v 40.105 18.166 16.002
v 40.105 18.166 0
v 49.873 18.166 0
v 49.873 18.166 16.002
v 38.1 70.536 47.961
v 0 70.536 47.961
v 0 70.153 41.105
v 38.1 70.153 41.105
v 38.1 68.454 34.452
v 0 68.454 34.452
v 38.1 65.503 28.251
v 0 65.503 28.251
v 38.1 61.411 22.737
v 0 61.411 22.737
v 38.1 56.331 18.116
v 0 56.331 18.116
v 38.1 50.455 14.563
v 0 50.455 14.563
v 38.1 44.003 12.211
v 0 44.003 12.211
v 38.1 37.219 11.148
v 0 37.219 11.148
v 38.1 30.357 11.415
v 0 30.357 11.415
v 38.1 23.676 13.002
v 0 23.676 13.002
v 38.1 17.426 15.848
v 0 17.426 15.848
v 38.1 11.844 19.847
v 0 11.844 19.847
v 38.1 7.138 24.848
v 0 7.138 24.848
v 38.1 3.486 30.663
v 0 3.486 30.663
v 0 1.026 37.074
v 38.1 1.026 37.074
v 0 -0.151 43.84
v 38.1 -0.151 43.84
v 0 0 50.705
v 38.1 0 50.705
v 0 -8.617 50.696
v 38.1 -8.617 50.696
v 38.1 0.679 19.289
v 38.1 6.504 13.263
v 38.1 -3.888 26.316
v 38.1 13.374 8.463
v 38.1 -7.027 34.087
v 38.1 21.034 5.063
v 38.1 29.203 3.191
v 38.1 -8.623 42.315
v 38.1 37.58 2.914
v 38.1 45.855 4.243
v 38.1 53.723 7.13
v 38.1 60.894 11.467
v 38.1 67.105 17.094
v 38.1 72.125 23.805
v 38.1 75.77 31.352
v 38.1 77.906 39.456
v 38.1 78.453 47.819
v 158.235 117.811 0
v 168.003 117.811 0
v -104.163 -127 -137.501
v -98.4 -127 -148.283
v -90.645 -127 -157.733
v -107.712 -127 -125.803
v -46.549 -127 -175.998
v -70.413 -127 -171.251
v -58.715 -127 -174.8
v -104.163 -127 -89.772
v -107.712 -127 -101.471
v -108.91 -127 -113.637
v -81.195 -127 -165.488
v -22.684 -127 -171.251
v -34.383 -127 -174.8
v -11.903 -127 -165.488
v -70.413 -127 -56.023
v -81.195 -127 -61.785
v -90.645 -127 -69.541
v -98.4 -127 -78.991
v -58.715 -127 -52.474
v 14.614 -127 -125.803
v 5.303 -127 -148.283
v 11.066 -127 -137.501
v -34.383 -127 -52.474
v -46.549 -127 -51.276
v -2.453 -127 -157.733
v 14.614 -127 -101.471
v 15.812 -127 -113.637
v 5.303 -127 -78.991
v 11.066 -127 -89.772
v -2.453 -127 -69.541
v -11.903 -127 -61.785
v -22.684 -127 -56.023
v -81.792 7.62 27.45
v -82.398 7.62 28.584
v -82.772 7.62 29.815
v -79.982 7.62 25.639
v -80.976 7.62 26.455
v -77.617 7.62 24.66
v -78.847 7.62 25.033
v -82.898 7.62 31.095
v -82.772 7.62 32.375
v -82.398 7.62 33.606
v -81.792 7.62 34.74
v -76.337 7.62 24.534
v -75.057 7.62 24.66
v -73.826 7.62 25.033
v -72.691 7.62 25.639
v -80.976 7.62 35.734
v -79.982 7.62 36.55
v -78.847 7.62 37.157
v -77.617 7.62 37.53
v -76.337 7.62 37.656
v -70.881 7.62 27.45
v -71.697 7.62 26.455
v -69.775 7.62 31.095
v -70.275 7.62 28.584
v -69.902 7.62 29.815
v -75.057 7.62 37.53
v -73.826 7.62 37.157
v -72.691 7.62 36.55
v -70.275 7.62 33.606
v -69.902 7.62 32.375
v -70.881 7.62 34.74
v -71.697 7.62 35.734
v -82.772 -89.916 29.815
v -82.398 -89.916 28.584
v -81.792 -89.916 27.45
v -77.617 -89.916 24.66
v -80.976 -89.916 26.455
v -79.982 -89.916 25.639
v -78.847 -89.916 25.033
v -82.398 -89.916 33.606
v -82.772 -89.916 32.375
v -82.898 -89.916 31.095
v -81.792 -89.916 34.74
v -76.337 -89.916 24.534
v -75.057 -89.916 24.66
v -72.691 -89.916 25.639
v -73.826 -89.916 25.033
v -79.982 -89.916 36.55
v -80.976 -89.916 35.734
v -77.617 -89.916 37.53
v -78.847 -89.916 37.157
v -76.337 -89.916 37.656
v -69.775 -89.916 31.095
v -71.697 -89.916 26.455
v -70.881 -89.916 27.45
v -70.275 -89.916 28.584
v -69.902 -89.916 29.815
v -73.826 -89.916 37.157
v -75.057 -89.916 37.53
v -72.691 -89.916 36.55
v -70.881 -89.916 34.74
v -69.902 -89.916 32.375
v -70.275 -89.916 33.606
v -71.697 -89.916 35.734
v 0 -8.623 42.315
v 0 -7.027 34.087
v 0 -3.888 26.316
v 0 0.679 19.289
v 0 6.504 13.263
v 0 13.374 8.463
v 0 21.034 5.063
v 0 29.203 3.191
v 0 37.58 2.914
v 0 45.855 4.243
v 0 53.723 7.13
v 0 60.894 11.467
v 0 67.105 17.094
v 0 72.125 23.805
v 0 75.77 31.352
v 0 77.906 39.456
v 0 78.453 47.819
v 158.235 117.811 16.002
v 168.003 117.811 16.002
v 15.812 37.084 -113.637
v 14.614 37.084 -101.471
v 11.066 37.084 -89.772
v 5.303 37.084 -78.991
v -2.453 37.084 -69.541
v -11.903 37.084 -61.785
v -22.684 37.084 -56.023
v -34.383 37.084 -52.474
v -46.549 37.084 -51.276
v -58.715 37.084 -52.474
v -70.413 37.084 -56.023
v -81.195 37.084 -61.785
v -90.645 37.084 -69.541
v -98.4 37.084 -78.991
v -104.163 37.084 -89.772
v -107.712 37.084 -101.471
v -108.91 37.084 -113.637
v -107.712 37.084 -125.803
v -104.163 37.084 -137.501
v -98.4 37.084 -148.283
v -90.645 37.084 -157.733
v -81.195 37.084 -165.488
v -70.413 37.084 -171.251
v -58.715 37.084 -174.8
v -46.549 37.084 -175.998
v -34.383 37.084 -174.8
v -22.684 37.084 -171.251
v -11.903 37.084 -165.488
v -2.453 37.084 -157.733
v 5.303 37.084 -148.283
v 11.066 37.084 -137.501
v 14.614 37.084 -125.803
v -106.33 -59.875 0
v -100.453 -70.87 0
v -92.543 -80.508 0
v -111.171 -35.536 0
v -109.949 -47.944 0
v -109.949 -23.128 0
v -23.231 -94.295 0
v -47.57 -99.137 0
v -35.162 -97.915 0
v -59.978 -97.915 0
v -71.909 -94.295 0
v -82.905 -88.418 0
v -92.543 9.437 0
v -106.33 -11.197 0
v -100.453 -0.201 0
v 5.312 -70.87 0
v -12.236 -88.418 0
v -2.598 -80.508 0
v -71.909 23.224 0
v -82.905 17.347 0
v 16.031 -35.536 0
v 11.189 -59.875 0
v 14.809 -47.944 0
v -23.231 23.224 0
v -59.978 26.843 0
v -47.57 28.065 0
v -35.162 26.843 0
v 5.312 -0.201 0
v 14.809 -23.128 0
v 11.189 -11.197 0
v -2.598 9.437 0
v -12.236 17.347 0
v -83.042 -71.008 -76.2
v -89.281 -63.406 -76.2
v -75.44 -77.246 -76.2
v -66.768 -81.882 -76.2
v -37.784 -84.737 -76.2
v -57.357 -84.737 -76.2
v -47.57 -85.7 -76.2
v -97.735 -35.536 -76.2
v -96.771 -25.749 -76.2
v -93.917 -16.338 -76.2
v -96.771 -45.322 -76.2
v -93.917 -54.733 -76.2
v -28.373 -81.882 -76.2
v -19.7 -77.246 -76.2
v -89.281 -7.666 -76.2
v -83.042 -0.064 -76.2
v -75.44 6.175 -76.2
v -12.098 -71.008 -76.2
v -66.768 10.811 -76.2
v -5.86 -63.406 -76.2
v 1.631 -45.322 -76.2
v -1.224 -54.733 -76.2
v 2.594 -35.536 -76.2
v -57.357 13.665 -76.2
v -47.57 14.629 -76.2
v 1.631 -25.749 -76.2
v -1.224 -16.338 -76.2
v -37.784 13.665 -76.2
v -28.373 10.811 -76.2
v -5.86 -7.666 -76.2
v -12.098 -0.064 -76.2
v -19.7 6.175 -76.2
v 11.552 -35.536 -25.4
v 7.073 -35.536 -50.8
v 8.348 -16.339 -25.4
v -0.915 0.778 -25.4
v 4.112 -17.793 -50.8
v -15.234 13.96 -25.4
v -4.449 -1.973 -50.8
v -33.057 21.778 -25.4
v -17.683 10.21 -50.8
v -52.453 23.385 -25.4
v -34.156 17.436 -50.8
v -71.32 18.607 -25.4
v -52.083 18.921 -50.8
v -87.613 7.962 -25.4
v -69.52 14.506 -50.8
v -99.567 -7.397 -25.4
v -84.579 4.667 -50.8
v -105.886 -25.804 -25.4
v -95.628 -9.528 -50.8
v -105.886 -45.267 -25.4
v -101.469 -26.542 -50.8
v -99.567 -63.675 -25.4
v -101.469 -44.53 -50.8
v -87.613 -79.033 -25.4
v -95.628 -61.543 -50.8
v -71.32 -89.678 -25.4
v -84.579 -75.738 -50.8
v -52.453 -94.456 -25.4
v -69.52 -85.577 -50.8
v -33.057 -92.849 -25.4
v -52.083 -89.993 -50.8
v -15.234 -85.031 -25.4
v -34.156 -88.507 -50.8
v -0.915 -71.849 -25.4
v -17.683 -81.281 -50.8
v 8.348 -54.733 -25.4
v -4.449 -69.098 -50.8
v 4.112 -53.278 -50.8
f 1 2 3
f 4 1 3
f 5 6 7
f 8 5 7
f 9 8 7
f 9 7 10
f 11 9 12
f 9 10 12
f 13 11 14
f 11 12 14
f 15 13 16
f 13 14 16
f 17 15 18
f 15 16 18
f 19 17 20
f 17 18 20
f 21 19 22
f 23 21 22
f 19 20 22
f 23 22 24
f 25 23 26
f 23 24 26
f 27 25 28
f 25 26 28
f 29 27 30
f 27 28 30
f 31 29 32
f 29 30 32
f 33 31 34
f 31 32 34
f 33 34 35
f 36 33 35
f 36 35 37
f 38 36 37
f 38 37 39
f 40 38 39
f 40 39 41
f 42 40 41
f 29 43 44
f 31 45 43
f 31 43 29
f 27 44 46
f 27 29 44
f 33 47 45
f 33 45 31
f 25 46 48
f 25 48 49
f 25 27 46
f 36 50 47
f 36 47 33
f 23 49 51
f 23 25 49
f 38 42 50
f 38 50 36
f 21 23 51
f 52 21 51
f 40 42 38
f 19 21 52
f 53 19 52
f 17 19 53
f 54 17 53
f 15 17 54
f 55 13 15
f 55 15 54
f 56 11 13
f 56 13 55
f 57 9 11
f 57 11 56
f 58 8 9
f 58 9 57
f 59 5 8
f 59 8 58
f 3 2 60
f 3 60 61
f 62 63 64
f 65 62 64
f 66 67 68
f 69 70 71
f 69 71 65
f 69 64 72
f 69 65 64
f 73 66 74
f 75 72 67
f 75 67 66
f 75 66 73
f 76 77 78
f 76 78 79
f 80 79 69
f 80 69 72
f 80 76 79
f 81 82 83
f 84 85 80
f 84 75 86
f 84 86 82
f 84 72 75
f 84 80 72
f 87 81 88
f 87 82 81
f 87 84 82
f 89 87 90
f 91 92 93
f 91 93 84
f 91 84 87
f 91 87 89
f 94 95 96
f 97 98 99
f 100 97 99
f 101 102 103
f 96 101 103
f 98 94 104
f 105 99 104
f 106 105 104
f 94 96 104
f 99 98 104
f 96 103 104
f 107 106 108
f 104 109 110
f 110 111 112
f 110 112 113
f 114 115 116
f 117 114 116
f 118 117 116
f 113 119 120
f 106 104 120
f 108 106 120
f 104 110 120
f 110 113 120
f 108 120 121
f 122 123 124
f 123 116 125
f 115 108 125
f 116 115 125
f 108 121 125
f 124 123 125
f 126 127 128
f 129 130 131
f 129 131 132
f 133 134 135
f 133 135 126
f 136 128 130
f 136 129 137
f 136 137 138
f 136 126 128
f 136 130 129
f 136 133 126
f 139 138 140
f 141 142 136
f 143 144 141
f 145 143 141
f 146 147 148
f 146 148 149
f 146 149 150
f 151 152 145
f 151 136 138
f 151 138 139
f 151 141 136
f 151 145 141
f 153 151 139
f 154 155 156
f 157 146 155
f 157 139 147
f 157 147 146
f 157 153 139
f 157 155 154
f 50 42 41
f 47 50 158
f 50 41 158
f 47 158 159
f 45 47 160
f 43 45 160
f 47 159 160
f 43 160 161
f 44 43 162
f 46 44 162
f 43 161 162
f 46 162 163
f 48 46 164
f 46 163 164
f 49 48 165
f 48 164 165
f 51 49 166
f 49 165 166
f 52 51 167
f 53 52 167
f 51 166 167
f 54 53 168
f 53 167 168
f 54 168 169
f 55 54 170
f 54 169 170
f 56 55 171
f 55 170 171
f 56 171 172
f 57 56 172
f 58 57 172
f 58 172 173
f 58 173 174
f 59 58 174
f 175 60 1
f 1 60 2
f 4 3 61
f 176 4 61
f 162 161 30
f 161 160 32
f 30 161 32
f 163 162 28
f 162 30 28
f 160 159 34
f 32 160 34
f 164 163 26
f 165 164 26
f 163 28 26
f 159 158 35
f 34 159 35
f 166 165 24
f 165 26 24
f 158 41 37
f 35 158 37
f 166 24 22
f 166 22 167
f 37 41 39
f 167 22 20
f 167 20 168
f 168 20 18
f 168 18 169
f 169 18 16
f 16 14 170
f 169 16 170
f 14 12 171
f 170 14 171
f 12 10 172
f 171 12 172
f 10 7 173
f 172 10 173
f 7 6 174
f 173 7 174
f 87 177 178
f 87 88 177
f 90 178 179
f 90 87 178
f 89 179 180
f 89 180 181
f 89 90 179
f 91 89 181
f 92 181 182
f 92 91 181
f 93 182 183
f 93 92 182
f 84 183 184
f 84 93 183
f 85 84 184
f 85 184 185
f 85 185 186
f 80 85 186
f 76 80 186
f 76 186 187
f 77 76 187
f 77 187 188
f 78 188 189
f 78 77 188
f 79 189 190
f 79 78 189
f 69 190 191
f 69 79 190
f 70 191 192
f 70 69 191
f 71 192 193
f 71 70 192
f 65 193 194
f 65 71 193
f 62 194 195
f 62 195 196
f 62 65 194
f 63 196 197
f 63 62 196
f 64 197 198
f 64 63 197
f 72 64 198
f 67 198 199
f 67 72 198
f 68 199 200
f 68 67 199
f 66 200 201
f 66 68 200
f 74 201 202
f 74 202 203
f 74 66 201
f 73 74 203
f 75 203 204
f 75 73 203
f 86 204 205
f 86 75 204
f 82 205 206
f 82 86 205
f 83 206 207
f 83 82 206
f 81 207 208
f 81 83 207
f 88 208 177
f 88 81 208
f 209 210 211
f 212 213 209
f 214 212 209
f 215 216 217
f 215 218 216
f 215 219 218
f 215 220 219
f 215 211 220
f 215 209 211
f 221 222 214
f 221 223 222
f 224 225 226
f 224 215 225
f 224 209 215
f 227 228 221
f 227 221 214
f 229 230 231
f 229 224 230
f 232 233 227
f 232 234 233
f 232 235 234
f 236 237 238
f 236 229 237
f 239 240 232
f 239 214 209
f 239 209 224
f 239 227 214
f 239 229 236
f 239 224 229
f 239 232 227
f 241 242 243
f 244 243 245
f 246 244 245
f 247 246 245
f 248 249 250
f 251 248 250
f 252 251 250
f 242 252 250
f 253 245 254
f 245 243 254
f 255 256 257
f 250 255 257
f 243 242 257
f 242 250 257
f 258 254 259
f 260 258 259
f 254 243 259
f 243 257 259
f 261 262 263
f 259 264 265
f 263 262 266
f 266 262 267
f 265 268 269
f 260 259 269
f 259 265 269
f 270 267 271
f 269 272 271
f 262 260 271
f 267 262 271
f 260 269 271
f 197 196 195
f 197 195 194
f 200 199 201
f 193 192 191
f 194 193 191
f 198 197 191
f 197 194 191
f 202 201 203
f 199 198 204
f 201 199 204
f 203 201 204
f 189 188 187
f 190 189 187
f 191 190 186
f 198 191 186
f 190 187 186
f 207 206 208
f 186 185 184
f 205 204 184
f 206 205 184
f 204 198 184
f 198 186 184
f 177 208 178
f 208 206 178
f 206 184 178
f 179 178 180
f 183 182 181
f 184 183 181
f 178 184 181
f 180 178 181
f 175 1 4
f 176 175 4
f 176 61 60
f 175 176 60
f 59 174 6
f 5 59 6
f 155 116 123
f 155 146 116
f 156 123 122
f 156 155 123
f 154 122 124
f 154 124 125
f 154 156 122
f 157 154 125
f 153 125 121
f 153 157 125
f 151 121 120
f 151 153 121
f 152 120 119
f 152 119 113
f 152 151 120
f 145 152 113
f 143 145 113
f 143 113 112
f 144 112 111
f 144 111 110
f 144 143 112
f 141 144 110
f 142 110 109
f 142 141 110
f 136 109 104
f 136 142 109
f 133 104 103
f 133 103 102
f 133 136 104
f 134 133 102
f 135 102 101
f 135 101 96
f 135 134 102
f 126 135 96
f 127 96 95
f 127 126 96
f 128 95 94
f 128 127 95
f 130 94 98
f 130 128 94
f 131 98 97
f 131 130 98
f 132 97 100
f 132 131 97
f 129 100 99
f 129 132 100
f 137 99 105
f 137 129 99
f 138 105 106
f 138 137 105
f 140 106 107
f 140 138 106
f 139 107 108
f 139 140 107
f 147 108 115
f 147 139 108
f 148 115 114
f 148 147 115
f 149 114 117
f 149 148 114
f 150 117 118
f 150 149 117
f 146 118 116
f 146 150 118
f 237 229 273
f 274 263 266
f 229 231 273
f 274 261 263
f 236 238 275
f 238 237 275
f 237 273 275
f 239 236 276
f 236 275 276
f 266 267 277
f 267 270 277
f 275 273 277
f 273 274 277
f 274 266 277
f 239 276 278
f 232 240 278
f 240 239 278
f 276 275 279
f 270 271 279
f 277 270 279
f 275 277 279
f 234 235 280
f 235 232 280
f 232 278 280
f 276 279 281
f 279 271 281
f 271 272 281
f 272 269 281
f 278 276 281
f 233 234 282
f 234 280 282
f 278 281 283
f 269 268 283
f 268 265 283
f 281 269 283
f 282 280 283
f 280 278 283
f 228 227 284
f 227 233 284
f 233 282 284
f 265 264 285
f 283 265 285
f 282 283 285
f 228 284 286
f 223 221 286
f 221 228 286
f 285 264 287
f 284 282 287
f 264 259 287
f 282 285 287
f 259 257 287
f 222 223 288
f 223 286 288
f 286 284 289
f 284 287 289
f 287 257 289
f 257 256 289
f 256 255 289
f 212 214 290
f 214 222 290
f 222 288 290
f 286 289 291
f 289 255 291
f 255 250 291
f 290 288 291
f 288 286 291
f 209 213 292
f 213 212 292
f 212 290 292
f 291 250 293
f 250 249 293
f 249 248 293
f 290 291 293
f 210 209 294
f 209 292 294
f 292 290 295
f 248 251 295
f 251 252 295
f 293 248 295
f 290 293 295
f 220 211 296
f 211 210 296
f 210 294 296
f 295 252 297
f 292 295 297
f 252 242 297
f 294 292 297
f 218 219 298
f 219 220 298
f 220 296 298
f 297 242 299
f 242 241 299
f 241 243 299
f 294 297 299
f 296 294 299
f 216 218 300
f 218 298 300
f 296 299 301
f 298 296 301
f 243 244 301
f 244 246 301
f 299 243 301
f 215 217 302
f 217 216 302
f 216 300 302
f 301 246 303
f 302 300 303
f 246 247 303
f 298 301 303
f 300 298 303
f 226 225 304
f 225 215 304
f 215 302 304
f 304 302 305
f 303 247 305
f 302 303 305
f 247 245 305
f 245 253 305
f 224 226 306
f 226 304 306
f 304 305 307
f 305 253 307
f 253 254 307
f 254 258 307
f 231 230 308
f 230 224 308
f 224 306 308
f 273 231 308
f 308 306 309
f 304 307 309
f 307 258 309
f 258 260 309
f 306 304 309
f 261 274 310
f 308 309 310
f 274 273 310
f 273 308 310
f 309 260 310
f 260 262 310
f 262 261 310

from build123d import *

# Parameters (mm, degrees)
F0_R          = 63.6009786396
F1_DEPTH      = 76.2
F1_TAPER      = 10
F2_R          = 62.3611729576
F3_DEPTH      = 127
F3_DEPTH_BACK = 37.084
F4_R          = 6.5611651664
F5_DEPTH      = 89.916
F5_DEPTH_BACK = 7.62
F7_DEPTH      = 16.002
F9_DEPTH      = 38.1


with BuildPart() as f1:
    # F0 (on Top) → F1 (new body)
    with BuildSketch(Plane.XY):
        with Locations((-47.5703850389, -35.5356149375)):
            Circle(F0_R)
    extrude(amount=-F1_DEPTH, taper=F1_TAPER)


with BuildPart() as f3:
    # F2 (on Front) → F3 (new body, two sides)
    with BuildSketch(Plane.XZ) as f3_sk:
        with Locations((-46.5486980975, -113.6368736625)):
            Circle(F2_R)
    extrude(amount=F3_DEPTH)
    extrude(f3_sk.sketch, amount=-F3_DEPTH_BACK)


with BuildPart() as f5:
    # F4 (on Front) → F5 (new body, two sides)
    with BuildSketch(Plane.XZ) as f5_sk:
        with Locations((-76.3366222382, 31.0949012637)):
            Circle(F4_R)
    extrude(amount=F5_DEPTH)
    extrude(f5_sk.sketch, amount=-F5_DEPTH_BACK)


with BuildPart() as f7:
    # F6 (on Top) → F7 (new body)
    with BuildSketch(Plane.XY):
        Polygon((40.1048237091, 18.1659460068), (49.8731993139, 18.1659460068), (168.0032251769, 117.8109869361), (158.2348495722, 117.8109869361), align=None)
    extrude(amount=F7_DEPTH)


with BuildPart() as f9:
    # F8 (on Right) → F9 (new body)
    with BuildSketch(Plane.YZ):
        with BuildLine():
            ThreePointArc((70.5356970429, 47.9614660144), (33.7812948817, 11.1151143445), (0, 50.7050603628))
            Line((0, 50.7050603628), (-8.6174700409, 50.6955124438))
            ThreePointArc((-8.6174700409, 50.6955124438), (33.3848422189, 2.8508487885), (78.4533694386, 47.8189922869))
            Line((78.4533694386, 47.8189922869), (70.5356970429, 47.9614660144))
        make_face()
    extrude(amount=F9_DEPTH)


solid = Compound([f1.part, f3.part, f5.part, f7.part, f9.part])
